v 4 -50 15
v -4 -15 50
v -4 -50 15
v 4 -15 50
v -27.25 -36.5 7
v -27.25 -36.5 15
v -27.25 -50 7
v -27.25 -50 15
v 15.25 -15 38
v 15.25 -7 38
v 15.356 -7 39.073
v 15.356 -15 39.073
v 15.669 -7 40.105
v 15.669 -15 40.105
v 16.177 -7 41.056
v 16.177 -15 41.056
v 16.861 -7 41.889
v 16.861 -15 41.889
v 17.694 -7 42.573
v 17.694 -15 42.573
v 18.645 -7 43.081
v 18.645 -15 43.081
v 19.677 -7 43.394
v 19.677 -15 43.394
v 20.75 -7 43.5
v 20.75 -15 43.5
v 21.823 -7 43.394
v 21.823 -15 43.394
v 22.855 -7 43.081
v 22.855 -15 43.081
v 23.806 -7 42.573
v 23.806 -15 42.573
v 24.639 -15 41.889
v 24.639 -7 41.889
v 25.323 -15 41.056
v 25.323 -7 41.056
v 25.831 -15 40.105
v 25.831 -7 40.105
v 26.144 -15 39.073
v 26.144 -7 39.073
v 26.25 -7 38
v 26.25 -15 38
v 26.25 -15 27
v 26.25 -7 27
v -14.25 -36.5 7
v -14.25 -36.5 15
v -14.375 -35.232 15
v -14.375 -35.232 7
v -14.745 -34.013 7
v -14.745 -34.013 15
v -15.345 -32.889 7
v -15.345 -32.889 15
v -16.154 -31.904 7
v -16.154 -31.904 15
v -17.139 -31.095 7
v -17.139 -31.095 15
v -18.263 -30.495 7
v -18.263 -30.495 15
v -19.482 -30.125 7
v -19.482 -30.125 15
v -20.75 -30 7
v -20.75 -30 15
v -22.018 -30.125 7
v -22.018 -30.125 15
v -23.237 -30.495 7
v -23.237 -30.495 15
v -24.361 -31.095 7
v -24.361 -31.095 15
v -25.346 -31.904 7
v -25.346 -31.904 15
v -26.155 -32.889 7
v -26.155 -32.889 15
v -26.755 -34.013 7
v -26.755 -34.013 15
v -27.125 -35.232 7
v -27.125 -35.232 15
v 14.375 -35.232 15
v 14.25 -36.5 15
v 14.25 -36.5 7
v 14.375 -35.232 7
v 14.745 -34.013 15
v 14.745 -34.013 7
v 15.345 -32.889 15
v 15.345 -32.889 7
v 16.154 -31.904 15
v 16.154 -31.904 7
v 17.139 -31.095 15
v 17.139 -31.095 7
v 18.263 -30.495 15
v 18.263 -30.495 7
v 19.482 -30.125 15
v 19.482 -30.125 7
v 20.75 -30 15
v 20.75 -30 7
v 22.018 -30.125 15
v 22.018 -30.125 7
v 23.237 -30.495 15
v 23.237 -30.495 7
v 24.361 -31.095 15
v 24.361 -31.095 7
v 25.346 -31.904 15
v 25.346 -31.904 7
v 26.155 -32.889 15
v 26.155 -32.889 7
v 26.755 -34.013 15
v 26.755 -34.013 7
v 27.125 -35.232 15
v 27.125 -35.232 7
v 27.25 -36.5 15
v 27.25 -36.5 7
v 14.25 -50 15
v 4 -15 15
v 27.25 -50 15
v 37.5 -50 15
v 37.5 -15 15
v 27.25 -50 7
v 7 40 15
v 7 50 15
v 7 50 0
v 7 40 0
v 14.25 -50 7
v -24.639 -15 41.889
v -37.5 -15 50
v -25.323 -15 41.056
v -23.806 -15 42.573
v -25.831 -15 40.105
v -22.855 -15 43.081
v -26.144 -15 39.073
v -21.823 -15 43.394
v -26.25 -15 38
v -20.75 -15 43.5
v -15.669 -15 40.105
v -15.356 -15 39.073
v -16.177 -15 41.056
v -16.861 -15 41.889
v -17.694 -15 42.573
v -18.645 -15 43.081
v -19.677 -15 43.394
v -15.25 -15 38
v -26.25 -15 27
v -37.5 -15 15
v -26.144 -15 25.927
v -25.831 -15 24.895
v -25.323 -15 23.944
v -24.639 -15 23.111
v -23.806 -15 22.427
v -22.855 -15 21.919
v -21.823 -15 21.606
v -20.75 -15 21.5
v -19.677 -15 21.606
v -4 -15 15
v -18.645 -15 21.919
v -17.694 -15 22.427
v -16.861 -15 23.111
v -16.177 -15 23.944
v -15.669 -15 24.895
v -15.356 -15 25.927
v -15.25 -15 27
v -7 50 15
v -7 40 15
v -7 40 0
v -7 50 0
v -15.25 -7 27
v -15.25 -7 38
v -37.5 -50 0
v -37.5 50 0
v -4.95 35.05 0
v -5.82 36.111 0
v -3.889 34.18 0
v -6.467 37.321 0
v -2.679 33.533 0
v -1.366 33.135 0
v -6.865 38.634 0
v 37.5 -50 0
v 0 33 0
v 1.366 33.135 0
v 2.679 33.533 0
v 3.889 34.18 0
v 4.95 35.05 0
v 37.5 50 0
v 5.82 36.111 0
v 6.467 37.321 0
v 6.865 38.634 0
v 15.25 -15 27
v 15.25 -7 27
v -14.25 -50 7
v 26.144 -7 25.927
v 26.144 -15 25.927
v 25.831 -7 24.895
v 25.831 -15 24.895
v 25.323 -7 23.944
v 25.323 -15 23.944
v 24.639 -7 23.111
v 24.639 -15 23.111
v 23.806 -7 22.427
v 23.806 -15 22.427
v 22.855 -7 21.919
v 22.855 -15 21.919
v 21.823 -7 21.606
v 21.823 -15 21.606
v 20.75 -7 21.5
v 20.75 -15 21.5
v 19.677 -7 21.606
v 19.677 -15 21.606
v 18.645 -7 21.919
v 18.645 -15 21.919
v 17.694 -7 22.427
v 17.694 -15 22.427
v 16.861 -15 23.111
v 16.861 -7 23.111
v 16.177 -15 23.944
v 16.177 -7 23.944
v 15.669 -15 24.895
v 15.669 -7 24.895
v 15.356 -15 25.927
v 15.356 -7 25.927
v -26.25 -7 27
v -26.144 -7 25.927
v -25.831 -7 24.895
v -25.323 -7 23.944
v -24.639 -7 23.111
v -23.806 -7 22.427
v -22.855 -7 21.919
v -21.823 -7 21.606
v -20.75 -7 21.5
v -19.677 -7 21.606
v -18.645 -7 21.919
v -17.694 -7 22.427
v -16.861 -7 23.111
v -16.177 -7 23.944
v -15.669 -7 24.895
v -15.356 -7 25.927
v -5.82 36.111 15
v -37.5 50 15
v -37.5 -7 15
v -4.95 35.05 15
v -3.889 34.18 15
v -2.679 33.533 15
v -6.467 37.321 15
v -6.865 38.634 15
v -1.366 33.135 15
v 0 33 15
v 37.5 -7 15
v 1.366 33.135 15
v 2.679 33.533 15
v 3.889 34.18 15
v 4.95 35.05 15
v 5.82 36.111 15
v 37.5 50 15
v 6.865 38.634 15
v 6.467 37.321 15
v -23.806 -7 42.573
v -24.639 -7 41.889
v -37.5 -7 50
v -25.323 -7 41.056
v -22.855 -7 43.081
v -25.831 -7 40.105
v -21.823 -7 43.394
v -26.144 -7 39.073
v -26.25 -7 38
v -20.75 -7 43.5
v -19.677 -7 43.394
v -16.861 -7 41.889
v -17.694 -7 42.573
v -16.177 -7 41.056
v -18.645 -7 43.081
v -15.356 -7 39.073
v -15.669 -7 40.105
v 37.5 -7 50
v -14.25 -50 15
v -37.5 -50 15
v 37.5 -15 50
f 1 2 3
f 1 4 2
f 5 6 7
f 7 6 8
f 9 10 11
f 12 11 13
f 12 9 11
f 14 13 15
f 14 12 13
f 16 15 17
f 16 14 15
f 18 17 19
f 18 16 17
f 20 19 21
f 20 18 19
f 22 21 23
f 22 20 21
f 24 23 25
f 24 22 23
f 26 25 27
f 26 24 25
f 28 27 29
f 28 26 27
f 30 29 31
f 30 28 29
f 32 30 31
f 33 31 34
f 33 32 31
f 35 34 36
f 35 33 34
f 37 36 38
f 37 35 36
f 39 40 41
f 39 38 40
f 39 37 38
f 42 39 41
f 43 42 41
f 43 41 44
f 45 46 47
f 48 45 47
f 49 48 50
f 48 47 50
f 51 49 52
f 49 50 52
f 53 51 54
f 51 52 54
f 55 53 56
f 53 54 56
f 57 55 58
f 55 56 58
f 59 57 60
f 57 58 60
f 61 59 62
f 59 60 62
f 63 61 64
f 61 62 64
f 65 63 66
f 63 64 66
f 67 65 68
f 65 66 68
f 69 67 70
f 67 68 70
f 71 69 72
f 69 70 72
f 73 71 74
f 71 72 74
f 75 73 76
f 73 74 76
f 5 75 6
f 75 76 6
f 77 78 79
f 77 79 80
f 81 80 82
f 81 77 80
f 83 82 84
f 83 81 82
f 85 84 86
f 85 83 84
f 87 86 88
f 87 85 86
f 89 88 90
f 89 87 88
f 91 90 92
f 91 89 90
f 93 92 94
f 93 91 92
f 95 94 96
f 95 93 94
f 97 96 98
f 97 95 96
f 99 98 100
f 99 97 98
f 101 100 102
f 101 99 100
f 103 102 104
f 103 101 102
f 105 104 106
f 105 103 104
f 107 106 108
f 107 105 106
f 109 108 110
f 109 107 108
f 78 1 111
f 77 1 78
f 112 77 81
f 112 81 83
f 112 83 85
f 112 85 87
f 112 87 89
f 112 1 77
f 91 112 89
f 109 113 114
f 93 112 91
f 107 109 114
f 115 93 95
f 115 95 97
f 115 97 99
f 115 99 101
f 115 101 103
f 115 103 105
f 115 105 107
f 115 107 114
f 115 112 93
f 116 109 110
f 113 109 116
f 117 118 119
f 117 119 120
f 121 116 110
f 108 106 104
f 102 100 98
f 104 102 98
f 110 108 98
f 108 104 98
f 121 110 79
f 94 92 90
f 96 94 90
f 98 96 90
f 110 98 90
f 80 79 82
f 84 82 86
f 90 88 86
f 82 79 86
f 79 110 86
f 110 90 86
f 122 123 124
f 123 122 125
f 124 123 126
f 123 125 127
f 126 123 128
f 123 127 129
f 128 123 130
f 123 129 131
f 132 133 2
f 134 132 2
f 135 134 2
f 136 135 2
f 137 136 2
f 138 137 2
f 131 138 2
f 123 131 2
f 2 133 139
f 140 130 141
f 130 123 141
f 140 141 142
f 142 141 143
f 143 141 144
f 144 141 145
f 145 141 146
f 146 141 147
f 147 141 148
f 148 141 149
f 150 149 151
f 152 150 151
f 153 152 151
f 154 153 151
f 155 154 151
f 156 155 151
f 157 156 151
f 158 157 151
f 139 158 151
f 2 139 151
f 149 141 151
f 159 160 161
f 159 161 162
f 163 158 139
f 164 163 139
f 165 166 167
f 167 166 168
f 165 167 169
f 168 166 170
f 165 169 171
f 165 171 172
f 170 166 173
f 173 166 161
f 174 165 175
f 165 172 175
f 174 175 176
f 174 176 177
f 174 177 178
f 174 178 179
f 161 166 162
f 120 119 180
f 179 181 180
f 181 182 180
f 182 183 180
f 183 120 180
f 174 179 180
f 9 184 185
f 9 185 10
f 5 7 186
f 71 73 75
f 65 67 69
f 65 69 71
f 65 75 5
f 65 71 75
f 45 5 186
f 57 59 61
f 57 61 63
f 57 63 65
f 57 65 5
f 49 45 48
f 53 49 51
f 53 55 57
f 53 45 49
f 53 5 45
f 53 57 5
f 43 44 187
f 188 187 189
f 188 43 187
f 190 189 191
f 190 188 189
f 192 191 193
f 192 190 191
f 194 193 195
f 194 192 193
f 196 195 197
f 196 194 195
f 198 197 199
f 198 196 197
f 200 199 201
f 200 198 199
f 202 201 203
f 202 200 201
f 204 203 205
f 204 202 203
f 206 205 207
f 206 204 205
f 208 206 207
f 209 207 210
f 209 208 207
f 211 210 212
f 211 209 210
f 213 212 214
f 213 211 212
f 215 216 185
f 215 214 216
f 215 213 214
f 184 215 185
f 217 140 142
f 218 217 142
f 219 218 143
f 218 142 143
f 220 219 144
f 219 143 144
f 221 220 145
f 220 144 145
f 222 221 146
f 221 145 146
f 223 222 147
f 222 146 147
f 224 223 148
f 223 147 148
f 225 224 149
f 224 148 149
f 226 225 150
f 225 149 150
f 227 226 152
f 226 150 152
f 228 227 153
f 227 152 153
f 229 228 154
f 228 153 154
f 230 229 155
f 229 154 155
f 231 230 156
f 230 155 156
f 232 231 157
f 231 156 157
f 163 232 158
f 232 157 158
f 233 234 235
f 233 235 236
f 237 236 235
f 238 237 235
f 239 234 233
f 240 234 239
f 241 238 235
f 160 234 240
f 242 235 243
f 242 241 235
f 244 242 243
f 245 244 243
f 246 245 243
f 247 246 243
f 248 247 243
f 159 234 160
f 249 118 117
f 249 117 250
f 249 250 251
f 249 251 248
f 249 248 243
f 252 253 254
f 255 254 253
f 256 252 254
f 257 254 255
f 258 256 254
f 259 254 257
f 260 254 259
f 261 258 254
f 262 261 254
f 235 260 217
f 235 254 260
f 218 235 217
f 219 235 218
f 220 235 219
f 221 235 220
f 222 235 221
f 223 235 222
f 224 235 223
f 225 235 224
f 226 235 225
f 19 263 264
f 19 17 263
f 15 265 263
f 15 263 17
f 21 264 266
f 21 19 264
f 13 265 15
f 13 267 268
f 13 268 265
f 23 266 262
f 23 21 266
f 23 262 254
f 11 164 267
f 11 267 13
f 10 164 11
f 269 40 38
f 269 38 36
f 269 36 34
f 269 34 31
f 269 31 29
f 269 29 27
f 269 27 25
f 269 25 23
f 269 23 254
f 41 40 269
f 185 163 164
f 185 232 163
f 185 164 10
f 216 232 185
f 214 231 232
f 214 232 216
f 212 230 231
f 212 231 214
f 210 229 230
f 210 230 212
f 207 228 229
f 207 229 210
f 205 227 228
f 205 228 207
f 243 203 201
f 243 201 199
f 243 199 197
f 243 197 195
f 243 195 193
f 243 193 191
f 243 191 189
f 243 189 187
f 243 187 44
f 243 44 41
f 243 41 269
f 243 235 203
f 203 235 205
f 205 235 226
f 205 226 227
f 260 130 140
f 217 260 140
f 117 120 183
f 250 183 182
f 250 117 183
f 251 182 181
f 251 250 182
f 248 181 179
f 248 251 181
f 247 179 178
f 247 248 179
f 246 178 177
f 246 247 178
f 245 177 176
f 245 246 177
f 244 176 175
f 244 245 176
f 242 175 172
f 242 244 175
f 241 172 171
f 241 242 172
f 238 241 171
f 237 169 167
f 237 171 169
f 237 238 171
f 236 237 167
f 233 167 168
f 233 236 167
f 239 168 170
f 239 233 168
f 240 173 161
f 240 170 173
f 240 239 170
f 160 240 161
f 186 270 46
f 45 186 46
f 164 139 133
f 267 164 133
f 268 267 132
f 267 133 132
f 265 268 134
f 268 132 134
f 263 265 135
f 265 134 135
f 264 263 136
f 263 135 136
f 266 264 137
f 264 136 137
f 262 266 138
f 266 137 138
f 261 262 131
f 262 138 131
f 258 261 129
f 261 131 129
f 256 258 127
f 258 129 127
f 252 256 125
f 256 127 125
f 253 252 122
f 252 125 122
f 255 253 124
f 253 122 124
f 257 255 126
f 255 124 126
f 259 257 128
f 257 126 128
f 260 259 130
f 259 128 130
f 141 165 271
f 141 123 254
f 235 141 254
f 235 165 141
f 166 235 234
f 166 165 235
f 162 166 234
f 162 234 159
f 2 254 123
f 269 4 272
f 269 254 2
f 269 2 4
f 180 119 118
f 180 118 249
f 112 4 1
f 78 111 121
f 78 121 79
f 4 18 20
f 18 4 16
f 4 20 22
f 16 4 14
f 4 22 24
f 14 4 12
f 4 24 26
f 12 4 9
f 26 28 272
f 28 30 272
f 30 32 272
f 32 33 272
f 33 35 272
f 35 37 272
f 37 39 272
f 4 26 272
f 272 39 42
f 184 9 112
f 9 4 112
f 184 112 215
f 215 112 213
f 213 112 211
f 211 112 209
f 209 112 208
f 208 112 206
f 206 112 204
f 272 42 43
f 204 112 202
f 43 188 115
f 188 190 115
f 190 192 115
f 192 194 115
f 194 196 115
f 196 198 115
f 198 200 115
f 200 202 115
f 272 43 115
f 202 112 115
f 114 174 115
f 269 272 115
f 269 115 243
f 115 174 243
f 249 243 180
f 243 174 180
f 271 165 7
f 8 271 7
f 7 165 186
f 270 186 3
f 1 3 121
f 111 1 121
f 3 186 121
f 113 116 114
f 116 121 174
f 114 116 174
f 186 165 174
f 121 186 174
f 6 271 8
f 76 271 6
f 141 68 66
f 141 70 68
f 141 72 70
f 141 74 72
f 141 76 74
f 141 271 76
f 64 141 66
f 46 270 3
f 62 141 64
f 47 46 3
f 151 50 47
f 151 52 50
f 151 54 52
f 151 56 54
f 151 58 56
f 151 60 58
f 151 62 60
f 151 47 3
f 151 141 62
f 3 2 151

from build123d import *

# Parameters (mm, degrees)
SKETCH_1_W          = 75
SKETCH_1_H          = 100
EXTRUDE_1_DEPTH     = 15
SKETCH_2_W          = 75
SKETCH_2_H          = 8
EXTRUDE_2_DEPTH     = 35
EXTRUDE_3_DEPTH     = 4
CUT_EXTRUDE_1_DEPTH = 91.173443984
CUT_EXTRUDE_2_DEPTH = 8
CUT_EXTRUDE_3_DEPTH = 72.632743909


with BuildPart() as part:
    # Эскиз1 → Бобышка-Вытянуть1 (new body)
    with BuildSketch(Plane.XY):
        Rectangle(SKETCH_1_W, SKETCH_1_H)
    extrude(amount=EXTRUDE_1_DEPTH)

    # Эскиз2 → Бобышка-Вытянуть2 (add)
    with BuildSketch(Plane.XY.offset(15)):
        with Locations((0, -11)):
            Rectangle(SKETCH_2_W, SKETCH_2_H)
    extrude(amount=EXTRUDE_2_DEPTH)

    # Эскиз3 → Бобышка-Вытянуть3 (add, symmetric)
    with BuildSketch(Plane(origin=(0, 0, 0), x_dir=(0, 0, -1), z_dir=(1, 0, 0))):
        Polygon((-50, -15), (-15, -50), (-15, -15), align=None)
    extrude(amount=EXTRUDE_3_DEPTH, both=True)

    # Эскиз4 → Вырез-Вытянуть1 (cut, through all)
    with BuildSketch(Plane.XZ.offset(15)):
        with BuildLine():
            Line((15.25, 27), (15.25, 38))
            ThreePointArc((15.25, 38), (20.75, 43.5), (26.25, 38))
            Line((26.25, 38), (26.25, 27))
            ThreePointArc((26.25, 27), (20.75, 21.5), (15.25, 27))
        make_face()
    cut_extrude_1 = extrude(amount=-CUT_EXTRUDE_1_DEPTH, mode=Mode.SUBTRACT)

    # Эскиз5 → Вырез-Вытянуть2 (cut)
    with BuildSketch(Plane.XY.offset(15)):
        with BuildLine():
            Line((14.25, -63.5), (14.25, -36.5))
            ThreePointArc((14.25, -36.5), (20.75, -30), (27.25, -36.5))
            Line((27.25, -36.5), (27.25, -63.5))
            ThreePointArc((27.25, -63.5), (20.75, -70), (14.25, -63.5))
        make_face()
    cut_extrude_2 = extrude(amount=-CUT_EXTRUDE_2_DEPTH, mode=Mode.SUBTRACT)

    # Эскиз6 → Вырез-Вытянуть3 (cut, through all)
    with BuildSketch(Plane.XY.offset(15)):
        with BuildLine():
            Line((7, 60), (7, 40))
            ThreePointArc((7, 40), (0, 33), (-7, 40))
            Line((-7, 40), (-7, 60))
            ThreePointArc((-7, 60), (0, 67), (7, 60))
        make_face()
    extrude(amount=-CUT_EXTRUDE_3_DEPTH, mode=Mode.SUBTRACT)

    # Зеркальное отражение1: Вырез-Вытянуть1, Вырез-Вытянуть2 across plane
    add(cut_extrude_1.mirror(Plane(origin=(0, 0, 0), x_dir=(0, 0, 1), z_dir=(1, 0, 0))), mode=Mode.SUBTRACT)
    add(cut_extrude_2.mirror(Plane(origin=(0, 0, 0), x_dir=(0, 0, 1), z_dir=(1, 0, 0))), mode=Mode.SUBTRACT)


solid = part.part
